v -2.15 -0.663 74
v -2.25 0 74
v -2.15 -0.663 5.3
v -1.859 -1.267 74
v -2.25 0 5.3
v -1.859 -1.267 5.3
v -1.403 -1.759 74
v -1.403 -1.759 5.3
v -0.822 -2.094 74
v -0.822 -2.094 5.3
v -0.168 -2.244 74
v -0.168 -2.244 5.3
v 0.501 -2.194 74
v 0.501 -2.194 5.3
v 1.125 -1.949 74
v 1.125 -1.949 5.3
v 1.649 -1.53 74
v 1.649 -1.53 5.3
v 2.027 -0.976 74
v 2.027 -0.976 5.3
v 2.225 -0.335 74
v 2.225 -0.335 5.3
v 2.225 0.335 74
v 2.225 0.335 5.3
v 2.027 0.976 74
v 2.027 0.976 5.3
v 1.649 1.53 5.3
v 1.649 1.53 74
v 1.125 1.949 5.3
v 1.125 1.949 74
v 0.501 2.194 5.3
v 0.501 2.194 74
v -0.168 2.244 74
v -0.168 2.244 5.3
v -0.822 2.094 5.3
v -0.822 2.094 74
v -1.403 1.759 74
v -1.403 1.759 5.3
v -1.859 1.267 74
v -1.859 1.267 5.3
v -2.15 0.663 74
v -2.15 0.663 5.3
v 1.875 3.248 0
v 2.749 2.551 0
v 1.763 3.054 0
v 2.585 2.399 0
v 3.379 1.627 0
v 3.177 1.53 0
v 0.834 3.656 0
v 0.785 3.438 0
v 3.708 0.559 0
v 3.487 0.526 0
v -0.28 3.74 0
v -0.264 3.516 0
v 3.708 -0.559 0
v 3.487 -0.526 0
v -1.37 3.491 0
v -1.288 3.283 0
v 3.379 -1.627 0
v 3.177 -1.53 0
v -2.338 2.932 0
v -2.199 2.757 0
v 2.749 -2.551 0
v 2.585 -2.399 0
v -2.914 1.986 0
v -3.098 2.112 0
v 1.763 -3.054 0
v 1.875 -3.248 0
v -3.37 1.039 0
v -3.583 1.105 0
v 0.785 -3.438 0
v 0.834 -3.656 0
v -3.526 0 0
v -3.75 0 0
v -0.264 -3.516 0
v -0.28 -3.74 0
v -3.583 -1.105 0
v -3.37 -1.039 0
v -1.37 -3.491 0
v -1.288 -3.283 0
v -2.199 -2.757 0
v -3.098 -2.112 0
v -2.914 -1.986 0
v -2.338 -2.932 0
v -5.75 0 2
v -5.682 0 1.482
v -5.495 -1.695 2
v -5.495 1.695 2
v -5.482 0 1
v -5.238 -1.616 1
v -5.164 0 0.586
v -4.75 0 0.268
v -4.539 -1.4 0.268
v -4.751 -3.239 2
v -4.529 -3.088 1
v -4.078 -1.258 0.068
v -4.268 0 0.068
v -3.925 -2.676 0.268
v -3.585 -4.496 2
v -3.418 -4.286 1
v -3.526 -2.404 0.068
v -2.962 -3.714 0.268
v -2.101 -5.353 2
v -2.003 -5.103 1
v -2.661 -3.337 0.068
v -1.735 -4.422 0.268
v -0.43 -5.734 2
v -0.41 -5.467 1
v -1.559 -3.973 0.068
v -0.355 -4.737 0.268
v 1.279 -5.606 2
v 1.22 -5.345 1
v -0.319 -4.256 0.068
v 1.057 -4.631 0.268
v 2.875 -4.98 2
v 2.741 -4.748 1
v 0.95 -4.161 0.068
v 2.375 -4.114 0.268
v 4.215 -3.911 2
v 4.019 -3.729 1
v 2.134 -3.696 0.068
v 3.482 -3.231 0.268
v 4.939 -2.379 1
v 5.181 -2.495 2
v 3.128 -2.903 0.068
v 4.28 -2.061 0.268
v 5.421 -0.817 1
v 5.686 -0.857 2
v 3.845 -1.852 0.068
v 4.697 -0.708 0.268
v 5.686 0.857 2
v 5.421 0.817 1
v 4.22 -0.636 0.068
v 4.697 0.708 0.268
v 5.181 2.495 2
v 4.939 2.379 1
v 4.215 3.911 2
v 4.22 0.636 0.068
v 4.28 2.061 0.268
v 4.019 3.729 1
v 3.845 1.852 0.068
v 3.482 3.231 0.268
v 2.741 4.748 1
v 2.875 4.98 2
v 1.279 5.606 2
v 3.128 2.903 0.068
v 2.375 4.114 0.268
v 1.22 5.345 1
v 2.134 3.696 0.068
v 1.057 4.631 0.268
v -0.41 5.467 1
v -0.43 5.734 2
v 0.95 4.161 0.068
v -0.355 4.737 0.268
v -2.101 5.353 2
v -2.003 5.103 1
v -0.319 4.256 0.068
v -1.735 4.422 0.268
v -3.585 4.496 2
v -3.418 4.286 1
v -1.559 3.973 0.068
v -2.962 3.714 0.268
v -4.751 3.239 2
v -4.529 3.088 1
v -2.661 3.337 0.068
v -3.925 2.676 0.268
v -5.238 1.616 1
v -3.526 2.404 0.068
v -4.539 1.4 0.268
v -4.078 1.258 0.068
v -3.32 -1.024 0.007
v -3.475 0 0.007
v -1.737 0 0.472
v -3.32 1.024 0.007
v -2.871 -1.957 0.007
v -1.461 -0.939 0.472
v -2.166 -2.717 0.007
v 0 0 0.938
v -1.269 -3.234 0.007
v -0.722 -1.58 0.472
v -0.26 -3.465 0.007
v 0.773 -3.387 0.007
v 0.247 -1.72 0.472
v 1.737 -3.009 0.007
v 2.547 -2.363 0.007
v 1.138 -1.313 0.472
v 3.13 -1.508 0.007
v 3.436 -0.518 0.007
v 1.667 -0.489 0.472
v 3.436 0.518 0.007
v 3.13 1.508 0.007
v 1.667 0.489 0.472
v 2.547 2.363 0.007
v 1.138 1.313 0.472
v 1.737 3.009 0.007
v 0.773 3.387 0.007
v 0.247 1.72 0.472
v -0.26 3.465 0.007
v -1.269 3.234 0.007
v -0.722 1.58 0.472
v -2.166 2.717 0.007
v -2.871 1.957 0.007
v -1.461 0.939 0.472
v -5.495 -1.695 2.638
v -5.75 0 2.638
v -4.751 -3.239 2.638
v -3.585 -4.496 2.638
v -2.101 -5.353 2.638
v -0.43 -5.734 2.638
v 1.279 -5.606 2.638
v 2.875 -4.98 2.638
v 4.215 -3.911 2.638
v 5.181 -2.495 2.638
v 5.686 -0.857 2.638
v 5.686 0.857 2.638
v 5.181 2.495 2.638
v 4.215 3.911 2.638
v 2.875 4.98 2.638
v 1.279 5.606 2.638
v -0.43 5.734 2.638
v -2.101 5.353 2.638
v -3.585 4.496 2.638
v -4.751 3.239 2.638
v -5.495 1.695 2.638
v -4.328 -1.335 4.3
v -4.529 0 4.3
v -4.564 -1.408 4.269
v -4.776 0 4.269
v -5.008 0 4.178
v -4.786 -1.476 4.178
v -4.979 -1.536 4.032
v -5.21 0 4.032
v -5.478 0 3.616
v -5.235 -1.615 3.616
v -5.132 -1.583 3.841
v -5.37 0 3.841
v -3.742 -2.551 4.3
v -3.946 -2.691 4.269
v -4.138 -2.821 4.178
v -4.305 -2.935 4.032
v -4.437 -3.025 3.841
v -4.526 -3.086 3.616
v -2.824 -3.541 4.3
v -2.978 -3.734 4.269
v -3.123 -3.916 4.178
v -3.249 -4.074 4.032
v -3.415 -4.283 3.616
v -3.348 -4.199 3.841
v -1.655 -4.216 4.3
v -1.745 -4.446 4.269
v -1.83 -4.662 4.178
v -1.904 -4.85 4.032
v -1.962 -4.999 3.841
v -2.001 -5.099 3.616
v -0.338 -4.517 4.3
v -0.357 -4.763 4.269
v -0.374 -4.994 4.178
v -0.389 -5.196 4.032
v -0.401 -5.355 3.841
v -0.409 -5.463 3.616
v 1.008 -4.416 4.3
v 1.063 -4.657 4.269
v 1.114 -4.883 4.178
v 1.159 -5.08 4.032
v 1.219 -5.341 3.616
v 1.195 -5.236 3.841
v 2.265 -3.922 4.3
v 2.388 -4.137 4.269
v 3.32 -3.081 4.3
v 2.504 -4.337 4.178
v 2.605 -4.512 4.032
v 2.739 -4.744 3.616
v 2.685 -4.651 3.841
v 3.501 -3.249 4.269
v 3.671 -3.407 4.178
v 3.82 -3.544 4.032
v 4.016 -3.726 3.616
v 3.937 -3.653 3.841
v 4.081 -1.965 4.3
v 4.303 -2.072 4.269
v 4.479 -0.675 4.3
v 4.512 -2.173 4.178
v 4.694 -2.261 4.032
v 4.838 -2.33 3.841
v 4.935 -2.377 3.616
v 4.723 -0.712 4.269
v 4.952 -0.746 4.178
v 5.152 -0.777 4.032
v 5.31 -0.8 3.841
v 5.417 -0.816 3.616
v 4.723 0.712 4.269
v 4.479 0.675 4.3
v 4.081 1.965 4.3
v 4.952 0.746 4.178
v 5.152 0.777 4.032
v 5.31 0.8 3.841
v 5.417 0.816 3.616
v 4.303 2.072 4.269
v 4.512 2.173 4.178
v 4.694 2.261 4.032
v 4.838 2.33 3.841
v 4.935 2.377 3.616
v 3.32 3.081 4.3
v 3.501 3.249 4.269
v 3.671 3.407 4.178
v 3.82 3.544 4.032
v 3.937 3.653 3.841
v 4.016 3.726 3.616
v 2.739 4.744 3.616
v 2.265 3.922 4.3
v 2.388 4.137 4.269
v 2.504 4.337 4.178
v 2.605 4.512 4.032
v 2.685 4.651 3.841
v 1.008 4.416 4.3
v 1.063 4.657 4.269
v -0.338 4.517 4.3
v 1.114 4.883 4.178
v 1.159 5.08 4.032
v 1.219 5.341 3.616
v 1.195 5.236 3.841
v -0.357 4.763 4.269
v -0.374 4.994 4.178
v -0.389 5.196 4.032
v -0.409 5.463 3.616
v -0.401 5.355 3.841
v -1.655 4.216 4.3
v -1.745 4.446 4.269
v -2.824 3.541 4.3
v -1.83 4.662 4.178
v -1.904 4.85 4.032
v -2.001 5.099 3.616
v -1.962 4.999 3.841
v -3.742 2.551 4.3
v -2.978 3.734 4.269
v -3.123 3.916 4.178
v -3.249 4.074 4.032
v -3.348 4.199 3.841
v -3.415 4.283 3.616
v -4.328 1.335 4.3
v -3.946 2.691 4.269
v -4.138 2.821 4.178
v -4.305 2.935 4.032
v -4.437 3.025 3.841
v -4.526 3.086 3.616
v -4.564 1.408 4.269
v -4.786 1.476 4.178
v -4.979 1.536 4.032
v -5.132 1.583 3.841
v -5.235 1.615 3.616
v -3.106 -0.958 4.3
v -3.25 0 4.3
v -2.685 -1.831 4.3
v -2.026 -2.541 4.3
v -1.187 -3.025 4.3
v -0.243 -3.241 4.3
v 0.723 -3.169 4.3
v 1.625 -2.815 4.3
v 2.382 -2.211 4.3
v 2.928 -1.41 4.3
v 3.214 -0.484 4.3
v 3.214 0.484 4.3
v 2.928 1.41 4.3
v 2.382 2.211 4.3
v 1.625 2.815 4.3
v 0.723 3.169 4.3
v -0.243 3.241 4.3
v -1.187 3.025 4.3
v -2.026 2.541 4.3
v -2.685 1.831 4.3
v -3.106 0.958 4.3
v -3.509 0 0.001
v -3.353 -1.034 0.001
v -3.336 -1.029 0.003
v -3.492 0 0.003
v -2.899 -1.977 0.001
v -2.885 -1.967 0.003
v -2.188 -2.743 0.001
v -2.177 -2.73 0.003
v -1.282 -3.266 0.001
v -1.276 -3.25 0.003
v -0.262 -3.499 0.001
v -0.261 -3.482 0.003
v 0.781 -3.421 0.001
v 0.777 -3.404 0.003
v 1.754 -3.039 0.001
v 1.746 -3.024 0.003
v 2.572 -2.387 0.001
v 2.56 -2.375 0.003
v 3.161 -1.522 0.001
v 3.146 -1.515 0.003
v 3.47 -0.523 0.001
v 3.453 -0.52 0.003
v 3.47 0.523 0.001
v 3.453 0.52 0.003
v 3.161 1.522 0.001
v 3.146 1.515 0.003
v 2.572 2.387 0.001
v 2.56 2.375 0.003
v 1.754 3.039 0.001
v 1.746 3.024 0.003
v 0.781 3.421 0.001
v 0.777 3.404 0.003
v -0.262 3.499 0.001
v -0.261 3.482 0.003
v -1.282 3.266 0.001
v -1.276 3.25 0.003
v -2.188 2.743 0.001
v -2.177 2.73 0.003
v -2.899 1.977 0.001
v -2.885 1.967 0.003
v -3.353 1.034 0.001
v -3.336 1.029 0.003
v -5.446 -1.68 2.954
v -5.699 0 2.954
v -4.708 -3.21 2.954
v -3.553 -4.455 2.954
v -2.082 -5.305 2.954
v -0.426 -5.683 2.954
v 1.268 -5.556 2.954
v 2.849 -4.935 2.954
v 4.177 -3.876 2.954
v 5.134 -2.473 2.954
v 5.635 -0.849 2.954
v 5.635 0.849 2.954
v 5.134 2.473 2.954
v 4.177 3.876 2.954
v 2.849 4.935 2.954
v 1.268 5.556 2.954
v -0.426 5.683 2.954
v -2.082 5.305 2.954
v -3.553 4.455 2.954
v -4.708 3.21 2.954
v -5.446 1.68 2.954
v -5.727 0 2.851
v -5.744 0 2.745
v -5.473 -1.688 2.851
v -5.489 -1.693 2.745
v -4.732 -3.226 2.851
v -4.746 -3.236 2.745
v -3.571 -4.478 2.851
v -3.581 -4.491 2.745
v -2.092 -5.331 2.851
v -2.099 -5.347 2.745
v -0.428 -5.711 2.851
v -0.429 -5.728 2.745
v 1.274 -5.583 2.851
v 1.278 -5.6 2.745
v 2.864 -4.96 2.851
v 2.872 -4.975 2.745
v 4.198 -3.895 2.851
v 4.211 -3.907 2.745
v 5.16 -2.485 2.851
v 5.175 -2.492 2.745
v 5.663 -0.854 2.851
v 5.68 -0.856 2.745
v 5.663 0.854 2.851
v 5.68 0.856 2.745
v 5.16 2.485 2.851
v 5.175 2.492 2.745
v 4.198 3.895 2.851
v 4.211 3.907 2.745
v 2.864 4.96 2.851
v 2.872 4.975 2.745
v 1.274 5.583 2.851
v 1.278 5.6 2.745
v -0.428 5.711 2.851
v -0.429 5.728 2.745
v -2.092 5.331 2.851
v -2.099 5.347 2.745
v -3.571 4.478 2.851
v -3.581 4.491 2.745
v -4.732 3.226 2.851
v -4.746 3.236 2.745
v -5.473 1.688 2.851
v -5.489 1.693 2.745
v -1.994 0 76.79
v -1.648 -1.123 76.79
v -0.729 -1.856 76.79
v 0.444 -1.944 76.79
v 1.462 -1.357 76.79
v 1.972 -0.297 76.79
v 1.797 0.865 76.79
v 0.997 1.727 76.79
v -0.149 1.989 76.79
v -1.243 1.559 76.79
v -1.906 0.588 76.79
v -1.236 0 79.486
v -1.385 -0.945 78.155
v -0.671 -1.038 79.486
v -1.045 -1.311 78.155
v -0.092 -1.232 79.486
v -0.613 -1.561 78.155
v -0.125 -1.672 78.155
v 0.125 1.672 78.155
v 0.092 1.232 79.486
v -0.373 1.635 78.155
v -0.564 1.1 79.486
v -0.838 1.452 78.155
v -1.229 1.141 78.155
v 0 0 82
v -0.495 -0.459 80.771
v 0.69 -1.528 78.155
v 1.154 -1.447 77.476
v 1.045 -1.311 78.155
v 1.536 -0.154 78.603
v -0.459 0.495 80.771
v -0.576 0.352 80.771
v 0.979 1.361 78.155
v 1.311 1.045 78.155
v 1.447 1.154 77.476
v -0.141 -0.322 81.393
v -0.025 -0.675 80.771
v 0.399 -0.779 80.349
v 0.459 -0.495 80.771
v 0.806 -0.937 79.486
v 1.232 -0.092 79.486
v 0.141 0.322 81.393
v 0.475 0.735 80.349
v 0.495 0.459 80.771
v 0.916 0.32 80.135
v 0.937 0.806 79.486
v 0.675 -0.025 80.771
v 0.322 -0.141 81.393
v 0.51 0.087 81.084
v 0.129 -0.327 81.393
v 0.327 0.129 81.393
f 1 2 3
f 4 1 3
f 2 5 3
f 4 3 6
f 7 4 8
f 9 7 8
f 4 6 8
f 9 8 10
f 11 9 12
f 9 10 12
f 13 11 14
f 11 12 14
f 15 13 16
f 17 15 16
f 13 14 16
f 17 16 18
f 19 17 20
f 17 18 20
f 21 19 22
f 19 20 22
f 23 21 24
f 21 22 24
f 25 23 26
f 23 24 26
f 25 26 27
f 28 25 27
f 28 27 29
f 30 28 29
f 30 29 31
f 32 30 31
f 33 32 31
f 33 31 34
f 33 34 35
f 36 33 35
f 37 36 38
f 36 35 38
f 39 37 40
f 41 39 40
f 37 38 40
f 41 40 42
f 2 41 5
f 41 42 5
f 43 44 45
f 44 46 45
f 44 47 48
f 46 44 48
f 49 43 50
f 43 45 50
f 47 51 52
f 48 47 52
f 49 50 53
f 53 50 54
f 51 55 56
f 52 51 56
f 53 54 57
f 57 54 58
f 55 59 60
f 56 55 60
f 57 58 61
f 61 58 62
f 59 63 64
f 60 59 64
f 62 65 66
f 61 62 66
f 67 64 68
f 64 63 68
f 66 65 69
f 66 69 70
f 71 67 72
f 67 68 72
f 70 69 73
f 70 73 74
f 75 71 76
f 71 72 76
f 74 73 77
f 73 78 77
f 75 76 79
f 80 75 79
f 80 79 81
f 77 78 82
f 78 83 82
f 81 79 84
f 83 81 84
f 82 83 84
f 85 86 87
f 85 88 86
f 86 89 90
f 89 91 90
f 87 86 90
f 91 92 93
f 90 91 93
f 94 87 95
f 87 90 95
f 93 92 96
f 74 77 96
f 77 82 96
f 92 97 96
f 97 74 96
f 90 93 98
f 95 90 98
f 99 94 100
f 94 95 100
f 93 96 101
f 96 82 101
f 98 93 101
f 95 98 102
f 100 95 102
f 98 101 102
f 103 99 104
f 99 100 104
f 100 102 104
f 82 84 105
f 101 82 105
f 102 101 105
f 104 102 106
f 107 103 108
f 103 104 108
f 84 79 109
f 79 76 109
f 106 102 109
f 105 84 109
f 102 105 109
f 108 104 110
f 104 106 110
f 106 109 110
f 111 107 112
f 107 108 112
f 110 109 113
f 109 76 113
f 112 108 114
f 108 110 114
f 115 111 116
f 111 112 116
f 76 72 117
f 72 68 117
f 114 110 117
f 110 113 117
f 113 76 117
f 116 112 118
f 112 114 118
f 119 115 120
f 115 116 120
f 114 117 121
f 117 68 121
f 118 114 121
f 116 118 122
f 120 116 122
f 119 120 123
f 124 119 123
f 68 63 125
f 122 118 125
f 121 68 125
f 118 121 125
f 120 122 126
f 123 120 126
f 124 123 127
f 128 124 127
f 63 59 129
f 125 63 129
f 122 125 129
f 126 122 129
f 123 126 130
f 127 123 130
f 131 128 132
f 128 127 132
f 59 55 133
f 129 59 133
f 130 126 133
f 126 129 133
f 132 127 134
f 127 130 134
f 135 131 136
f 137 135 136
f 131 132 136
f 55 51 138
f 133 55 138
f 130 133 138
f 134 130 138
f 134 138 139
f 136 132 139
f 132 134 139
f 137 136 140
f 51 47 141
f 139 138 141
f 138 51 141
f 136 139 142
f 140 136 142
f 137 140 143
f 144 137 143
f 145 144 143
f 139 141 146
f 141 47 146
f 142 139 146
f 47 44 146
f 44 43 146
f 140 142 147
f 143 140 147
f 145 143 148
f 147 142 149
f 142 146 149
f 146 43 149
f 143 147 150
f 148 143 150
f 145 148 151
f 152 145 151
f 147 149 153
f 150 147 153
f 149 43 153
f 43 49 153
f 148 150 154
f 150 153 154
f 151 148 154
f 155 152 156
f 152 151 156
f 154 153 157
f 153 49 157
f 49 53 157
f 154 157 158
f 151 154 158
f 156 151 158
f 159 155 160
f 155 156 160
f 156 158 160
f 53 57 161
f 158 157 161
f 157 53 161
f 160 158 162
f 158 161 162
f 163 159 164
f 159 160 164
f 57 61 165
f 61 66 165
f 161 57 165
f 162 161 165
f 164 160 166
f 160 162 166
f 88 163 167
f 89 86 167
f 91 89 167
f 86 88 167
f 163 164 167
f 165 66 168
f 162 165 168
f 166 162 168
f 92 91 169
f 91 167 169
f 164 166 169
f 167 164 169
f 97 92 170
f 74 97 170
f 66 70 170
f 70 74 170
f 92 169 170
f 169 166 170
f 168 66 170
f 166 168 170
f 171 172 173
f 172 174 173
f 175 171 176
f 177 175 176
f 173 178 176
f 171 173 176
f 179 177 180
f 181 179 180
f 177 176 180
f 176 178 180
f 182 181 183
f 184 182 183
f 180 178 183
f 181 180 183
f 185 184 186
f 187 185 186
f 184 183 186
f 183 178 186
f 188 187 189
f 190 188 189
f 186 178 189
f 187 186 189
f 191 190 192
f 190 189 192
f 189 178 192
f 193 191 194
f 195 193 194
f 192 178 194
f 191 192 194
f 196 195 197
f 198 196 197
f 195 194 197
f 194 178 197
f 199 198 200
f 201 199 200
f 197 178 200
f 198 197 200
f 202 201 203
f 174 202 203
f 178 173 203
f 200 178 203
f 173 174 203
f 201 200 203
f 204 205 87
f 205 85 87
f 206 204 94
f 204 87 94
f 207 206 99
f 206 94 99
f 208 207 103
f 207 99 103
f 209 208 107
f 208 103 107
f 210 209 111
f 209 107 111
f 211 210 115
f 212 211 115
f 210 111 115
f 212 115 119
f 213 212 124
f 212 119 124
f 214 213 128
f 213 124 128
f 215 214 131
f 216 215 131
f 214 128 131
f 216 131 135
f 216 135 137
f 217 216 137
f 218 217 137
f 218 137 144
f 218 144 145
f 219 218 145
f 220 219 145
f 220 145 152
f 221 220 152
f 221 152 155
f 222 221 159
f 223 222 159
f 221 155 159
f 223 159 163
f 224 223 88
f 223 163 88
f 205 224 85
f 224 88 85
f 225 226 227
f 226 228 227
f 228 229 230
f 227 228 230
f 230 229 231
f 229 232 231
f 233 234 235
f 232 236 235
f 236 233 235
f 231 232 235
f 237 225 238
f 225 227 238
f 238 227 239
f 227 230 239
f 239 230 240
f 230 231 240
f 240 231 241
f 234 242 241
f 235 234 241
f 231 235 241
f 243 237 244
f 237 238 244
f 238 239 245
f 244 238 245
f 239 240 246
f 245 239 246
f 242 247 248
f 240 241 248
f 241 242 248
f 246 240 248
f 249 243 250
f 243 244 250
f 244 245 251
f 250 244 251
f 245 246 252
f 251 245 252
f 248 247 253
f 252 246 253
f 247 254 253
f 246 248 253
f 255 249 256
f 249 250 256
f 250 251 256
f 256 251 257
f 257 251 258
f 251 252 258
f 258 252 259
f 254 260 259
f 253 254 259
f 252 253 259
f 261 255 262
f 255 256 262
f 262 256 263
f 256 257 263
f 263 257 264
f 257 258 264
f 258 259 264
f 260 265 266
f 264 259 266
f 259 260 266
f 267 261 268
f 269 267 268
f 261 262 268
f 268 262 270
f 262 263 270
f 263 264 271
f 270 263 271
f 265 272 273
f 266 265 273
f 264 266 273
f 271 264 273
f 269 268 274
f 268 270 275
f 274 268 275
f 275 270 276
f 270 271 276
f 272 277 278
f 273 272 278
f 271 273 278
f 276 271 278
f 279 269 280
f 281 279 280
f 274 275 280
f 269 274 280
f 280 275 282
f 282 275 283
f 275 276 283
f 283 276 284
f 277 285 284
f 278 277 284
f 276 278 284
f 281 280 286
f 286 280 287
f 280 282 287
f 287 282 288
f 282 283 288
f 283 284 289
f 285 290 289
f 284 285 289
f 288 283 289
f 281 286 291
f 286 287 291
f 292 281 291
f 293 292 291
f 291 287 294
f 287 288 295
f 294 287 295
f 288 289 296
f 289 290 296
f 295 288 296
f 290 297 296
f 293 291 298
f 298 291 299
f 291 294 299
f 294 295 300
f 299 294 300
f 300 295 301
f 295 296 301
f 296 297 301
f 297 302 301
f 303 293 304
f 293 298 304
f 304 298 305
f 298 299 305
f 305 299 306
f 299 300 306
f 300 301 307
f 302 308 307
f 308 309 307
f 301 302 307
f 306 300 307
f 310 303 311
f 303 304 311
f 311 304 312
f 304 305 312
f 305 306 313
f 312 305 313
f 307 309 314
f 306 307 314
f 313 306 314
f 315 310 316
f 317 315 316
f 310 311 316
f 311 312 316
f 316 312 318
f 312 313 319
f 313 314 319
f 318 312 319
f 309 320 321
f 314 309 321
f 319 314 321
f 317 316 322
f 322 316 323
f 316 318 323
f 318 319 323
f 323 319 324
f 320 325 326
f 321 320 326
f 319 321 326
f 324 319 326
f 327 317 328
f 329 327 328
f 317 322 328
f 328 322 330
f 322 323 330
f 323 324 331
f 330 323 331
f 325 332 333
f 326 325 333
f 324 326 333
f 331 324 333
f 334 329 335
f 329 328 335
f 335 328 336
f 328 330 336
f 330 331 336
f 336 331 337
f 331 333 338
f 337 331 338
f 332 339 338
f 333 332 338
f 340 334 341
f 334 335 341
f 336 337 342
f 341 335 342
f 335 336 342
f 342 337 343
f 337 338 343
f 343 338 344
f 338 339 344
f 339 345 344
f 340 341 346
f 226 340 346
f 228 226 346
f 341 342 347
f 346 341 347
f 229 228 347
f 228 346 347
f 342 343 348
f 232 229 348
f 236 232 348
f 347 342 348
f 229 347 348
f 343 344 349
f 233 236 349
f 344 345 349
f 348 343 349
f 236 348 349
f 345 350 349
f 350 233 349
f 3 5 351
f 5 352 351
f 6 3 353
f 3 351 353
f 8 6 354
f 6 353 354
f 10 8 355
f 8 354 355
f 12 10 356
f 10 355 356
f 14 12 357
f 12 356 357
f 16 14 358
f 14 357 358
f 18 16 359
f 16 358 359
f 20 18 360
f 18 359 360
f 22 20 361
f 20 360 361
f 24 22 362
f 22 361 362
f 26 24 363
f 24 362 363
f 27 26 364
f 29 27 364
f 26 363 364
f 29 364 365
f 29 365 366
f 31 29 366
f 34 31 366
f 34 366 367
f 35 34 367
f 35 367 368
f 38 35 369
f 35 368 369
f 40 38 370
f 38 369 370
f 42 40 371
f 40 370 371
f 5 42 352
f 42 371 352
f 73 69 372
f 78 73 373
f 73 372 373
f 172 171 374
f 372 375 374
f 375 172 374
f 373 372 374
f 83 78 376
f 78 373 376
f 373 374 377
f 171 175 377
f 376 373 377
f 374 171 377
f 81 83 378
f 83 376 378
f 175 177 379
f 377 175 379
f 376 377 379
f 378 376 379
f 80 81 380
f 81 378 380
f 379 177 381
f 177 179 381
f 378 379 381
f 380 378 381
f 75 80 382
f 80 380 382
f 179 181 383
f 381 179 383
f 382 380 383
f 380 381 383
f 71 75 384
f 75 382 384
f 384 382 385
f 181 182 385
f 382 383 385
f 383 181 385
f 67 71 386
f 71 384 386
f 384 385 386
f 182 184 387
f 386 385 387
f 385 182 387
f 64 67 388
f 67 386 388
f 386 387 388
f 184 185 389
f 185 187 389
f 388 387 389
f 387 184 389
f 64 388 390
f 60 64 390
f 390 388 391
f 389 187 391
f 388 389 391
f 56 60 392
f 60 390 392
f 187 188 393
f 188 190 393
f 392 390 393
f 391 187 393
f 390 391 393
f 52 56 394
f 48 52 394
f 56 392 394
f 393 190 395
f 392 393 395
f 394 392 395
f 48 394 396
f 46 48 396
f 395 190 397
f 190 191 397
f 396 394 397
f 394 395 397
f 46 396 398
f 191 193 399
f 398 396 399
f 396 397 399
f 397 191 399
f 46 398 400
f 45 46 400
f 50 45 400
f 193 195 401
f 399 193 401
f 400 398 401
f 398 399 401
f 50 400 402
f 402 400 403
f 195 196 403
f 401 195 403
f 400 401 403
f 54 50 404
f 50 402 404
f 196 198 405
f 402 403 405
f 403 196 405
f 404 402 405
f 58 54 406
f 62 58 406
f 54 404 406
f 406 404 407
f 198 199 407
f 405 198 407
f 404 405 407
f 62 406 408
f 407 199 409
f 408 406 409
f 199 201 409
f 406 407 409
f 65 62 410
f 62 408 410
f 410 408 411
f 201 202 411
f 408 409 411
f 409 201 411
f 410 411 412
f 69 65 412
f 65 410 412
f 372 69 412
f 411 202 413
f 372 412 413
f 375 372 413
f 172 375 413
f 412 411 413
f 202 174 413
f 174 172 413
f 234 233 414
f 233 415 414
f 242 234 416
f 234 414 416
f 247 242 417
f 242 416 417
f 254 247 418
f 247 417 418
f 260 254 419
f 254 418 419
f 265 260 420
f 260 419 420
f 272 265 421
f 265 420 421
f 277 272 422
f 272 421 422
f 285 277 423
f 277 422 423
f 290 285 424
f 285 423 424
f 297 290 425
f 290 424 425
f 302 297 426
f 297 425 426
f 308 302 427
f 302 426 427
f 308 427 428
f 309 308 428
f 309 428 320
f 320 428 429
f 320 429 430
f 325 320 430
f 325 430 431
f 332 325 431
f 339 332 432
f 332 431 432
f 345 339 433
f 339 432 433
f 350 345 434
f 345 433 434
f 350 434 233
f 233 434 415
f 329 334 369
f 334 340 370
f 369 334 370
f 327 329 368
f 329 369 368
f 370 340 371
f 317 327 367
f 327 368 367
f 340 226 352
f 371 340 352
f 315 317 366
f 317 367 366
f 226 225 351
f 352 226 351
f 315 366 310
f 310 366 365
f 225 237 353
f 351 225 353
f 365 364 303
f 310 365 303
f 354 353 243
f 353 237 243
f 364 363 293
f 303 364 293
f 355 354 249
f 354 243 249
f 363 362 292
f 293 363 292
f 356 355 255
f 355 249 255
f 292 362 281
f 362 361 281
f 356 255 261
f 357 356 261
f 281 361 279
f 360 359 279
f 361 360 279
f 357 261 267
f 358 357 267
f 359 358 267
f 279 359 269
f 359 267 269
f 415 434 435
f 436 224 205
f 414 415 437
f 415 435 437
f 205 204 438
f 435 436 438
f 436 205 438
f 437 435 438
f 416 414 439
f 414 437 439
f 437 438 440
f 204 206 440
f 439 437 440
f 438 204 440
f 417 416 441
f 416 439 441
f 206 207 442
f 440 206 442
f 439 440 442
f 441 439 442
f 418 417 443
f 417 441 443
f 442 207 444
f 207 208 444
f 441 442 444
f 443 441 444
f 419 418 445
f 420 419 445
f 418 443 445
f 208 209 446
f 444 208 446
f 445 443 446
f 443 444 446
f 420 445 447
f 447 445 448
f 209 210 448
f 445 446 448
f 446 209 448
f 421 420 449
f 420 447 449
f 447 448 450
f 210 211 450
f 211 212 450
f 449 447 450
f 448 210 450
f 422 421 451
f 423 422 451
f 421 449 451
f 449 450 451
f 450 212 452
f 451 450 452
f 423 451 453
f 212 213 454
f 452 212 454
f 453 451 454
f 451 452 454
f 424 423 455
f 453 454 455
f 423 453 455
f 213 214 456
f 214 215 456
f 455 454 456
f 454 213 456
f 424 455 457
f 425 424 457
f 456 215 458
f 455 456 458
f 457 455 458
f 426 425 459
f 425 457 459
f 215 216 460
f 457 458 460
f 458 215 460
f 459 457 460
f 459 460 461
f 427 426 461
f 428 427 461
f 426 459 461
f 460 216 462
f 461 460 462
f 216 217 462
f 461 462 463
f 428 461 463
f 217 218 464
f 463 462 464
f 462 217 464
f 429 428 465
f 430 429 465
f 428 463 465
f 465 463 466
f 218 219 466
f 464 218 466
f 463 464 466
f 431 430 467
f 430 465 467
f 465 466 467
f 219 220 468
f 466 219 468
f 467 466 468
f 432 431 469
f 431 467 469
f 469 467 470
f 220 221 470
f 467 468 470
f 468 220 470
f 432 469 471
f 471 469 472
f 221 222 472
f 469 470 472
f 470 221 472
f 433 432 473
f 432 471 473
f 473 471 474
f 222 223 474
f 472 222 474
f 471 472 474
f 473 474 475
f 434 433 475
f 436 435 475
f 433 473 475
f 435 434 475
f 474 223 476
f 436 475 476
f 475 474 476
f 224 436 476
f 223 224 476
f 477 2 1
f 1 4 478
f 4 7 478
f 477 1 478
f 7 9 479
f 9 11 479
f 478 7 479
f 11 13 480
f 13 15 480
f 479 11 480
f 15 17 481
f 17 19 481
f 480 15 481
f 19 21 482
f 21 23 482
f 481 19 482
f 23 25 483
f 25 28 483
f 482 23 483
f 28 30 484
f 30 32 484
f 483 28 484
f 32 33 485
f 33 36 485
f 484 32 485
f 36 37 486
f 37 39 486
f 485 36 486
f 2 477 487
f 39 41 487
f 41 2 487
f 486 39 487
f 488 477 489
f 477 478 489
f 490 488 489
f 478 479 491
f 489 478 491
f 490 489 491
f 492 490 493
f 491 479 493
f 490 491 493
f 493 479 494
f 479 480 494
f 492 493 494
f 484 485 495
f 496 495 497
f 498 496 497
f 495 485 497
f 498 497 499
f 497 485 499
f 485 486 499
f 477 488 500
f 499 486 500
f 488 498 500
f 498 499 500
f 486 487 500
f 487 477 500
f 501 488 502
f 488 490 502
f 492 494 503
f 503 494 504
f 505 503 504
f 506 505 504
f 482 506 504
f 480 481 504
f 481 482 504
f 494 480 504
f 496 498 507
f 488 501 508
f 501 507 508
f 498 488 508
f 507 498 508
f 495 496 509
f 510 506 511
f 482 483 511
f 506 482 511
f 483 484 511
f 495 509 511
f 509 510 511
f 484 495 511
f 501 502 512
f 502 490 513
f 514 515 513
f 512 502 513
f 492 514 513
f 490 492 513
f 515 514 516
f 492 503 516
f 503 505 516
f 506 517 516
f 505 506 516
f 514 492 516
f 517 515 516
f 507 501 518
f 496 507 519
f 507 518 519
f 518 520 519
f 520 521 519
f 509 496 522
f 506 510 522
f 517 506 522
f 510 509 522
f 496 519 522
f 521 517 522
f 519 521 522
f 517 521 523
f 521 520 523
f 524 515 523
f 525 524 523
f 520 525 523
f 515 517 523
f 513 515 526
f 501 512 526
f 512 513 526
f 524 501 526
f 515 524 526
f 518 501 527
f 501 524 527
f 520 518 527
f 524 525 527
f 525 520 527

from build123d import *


with BuildPart() as part:
    # Skizze1 → Rotation1 (revolve)
    with BuildSketch(Plane(origin=(0, 0, 0), x_dir=(0, 0, -1), z_dir=(1, 0, 0)), mode=Mode.PRIVATE) as rotation1_sk:
        with BuildLine():
            Line((-0.006814835, 3.47456669), (-0.937822174, 0))
            Line((-0.937822174, 0), (-82, 0))
            ThreePointArc((-82, 0), (-78.155192535, 1.676795679), (-74, 2.25))
            Line((-74, 2.25), (-5.3, 2.25))
            Line((-5.3, 2.25), (-4.3, 3.25))
            Line((-4.3, 3.25), (-4.3, 4.52924078))
            ThreePointArc((-4.3, 4.52924078), (-4.111242185, 5.113951065), (-3.616227766, 5.477924078))
            Line((-3.616227766, 5.477924078), (-2.953950106, 5.698683298))
            ThreePointArc((-2.953950106, 5.698683298), (-2.797904583, 5.737087458), (-2.63772234, 5.75))
            Line((-2.63772234, 5.75), (-2, 5.75))
            ThreePointArc((-2, 5.75), (-0.585786438, 5.164213562), (0, 3.75))
            Line((0, 3.75), (0, 3.5263305))
            ThreePointArc((0, 3.5263305), (-0.001711028, 3.500225261), (-0.006814835, 3.47456669))
        make_face()
    revolve(rotation1_sk.sketch.rotate(Axis((0, 0, 0), (0, 0, 1)), 90), axis=Axis((0, 0, 0), (0, 0, 1)))  # turned: the seam where the file's is


solid = part.part
